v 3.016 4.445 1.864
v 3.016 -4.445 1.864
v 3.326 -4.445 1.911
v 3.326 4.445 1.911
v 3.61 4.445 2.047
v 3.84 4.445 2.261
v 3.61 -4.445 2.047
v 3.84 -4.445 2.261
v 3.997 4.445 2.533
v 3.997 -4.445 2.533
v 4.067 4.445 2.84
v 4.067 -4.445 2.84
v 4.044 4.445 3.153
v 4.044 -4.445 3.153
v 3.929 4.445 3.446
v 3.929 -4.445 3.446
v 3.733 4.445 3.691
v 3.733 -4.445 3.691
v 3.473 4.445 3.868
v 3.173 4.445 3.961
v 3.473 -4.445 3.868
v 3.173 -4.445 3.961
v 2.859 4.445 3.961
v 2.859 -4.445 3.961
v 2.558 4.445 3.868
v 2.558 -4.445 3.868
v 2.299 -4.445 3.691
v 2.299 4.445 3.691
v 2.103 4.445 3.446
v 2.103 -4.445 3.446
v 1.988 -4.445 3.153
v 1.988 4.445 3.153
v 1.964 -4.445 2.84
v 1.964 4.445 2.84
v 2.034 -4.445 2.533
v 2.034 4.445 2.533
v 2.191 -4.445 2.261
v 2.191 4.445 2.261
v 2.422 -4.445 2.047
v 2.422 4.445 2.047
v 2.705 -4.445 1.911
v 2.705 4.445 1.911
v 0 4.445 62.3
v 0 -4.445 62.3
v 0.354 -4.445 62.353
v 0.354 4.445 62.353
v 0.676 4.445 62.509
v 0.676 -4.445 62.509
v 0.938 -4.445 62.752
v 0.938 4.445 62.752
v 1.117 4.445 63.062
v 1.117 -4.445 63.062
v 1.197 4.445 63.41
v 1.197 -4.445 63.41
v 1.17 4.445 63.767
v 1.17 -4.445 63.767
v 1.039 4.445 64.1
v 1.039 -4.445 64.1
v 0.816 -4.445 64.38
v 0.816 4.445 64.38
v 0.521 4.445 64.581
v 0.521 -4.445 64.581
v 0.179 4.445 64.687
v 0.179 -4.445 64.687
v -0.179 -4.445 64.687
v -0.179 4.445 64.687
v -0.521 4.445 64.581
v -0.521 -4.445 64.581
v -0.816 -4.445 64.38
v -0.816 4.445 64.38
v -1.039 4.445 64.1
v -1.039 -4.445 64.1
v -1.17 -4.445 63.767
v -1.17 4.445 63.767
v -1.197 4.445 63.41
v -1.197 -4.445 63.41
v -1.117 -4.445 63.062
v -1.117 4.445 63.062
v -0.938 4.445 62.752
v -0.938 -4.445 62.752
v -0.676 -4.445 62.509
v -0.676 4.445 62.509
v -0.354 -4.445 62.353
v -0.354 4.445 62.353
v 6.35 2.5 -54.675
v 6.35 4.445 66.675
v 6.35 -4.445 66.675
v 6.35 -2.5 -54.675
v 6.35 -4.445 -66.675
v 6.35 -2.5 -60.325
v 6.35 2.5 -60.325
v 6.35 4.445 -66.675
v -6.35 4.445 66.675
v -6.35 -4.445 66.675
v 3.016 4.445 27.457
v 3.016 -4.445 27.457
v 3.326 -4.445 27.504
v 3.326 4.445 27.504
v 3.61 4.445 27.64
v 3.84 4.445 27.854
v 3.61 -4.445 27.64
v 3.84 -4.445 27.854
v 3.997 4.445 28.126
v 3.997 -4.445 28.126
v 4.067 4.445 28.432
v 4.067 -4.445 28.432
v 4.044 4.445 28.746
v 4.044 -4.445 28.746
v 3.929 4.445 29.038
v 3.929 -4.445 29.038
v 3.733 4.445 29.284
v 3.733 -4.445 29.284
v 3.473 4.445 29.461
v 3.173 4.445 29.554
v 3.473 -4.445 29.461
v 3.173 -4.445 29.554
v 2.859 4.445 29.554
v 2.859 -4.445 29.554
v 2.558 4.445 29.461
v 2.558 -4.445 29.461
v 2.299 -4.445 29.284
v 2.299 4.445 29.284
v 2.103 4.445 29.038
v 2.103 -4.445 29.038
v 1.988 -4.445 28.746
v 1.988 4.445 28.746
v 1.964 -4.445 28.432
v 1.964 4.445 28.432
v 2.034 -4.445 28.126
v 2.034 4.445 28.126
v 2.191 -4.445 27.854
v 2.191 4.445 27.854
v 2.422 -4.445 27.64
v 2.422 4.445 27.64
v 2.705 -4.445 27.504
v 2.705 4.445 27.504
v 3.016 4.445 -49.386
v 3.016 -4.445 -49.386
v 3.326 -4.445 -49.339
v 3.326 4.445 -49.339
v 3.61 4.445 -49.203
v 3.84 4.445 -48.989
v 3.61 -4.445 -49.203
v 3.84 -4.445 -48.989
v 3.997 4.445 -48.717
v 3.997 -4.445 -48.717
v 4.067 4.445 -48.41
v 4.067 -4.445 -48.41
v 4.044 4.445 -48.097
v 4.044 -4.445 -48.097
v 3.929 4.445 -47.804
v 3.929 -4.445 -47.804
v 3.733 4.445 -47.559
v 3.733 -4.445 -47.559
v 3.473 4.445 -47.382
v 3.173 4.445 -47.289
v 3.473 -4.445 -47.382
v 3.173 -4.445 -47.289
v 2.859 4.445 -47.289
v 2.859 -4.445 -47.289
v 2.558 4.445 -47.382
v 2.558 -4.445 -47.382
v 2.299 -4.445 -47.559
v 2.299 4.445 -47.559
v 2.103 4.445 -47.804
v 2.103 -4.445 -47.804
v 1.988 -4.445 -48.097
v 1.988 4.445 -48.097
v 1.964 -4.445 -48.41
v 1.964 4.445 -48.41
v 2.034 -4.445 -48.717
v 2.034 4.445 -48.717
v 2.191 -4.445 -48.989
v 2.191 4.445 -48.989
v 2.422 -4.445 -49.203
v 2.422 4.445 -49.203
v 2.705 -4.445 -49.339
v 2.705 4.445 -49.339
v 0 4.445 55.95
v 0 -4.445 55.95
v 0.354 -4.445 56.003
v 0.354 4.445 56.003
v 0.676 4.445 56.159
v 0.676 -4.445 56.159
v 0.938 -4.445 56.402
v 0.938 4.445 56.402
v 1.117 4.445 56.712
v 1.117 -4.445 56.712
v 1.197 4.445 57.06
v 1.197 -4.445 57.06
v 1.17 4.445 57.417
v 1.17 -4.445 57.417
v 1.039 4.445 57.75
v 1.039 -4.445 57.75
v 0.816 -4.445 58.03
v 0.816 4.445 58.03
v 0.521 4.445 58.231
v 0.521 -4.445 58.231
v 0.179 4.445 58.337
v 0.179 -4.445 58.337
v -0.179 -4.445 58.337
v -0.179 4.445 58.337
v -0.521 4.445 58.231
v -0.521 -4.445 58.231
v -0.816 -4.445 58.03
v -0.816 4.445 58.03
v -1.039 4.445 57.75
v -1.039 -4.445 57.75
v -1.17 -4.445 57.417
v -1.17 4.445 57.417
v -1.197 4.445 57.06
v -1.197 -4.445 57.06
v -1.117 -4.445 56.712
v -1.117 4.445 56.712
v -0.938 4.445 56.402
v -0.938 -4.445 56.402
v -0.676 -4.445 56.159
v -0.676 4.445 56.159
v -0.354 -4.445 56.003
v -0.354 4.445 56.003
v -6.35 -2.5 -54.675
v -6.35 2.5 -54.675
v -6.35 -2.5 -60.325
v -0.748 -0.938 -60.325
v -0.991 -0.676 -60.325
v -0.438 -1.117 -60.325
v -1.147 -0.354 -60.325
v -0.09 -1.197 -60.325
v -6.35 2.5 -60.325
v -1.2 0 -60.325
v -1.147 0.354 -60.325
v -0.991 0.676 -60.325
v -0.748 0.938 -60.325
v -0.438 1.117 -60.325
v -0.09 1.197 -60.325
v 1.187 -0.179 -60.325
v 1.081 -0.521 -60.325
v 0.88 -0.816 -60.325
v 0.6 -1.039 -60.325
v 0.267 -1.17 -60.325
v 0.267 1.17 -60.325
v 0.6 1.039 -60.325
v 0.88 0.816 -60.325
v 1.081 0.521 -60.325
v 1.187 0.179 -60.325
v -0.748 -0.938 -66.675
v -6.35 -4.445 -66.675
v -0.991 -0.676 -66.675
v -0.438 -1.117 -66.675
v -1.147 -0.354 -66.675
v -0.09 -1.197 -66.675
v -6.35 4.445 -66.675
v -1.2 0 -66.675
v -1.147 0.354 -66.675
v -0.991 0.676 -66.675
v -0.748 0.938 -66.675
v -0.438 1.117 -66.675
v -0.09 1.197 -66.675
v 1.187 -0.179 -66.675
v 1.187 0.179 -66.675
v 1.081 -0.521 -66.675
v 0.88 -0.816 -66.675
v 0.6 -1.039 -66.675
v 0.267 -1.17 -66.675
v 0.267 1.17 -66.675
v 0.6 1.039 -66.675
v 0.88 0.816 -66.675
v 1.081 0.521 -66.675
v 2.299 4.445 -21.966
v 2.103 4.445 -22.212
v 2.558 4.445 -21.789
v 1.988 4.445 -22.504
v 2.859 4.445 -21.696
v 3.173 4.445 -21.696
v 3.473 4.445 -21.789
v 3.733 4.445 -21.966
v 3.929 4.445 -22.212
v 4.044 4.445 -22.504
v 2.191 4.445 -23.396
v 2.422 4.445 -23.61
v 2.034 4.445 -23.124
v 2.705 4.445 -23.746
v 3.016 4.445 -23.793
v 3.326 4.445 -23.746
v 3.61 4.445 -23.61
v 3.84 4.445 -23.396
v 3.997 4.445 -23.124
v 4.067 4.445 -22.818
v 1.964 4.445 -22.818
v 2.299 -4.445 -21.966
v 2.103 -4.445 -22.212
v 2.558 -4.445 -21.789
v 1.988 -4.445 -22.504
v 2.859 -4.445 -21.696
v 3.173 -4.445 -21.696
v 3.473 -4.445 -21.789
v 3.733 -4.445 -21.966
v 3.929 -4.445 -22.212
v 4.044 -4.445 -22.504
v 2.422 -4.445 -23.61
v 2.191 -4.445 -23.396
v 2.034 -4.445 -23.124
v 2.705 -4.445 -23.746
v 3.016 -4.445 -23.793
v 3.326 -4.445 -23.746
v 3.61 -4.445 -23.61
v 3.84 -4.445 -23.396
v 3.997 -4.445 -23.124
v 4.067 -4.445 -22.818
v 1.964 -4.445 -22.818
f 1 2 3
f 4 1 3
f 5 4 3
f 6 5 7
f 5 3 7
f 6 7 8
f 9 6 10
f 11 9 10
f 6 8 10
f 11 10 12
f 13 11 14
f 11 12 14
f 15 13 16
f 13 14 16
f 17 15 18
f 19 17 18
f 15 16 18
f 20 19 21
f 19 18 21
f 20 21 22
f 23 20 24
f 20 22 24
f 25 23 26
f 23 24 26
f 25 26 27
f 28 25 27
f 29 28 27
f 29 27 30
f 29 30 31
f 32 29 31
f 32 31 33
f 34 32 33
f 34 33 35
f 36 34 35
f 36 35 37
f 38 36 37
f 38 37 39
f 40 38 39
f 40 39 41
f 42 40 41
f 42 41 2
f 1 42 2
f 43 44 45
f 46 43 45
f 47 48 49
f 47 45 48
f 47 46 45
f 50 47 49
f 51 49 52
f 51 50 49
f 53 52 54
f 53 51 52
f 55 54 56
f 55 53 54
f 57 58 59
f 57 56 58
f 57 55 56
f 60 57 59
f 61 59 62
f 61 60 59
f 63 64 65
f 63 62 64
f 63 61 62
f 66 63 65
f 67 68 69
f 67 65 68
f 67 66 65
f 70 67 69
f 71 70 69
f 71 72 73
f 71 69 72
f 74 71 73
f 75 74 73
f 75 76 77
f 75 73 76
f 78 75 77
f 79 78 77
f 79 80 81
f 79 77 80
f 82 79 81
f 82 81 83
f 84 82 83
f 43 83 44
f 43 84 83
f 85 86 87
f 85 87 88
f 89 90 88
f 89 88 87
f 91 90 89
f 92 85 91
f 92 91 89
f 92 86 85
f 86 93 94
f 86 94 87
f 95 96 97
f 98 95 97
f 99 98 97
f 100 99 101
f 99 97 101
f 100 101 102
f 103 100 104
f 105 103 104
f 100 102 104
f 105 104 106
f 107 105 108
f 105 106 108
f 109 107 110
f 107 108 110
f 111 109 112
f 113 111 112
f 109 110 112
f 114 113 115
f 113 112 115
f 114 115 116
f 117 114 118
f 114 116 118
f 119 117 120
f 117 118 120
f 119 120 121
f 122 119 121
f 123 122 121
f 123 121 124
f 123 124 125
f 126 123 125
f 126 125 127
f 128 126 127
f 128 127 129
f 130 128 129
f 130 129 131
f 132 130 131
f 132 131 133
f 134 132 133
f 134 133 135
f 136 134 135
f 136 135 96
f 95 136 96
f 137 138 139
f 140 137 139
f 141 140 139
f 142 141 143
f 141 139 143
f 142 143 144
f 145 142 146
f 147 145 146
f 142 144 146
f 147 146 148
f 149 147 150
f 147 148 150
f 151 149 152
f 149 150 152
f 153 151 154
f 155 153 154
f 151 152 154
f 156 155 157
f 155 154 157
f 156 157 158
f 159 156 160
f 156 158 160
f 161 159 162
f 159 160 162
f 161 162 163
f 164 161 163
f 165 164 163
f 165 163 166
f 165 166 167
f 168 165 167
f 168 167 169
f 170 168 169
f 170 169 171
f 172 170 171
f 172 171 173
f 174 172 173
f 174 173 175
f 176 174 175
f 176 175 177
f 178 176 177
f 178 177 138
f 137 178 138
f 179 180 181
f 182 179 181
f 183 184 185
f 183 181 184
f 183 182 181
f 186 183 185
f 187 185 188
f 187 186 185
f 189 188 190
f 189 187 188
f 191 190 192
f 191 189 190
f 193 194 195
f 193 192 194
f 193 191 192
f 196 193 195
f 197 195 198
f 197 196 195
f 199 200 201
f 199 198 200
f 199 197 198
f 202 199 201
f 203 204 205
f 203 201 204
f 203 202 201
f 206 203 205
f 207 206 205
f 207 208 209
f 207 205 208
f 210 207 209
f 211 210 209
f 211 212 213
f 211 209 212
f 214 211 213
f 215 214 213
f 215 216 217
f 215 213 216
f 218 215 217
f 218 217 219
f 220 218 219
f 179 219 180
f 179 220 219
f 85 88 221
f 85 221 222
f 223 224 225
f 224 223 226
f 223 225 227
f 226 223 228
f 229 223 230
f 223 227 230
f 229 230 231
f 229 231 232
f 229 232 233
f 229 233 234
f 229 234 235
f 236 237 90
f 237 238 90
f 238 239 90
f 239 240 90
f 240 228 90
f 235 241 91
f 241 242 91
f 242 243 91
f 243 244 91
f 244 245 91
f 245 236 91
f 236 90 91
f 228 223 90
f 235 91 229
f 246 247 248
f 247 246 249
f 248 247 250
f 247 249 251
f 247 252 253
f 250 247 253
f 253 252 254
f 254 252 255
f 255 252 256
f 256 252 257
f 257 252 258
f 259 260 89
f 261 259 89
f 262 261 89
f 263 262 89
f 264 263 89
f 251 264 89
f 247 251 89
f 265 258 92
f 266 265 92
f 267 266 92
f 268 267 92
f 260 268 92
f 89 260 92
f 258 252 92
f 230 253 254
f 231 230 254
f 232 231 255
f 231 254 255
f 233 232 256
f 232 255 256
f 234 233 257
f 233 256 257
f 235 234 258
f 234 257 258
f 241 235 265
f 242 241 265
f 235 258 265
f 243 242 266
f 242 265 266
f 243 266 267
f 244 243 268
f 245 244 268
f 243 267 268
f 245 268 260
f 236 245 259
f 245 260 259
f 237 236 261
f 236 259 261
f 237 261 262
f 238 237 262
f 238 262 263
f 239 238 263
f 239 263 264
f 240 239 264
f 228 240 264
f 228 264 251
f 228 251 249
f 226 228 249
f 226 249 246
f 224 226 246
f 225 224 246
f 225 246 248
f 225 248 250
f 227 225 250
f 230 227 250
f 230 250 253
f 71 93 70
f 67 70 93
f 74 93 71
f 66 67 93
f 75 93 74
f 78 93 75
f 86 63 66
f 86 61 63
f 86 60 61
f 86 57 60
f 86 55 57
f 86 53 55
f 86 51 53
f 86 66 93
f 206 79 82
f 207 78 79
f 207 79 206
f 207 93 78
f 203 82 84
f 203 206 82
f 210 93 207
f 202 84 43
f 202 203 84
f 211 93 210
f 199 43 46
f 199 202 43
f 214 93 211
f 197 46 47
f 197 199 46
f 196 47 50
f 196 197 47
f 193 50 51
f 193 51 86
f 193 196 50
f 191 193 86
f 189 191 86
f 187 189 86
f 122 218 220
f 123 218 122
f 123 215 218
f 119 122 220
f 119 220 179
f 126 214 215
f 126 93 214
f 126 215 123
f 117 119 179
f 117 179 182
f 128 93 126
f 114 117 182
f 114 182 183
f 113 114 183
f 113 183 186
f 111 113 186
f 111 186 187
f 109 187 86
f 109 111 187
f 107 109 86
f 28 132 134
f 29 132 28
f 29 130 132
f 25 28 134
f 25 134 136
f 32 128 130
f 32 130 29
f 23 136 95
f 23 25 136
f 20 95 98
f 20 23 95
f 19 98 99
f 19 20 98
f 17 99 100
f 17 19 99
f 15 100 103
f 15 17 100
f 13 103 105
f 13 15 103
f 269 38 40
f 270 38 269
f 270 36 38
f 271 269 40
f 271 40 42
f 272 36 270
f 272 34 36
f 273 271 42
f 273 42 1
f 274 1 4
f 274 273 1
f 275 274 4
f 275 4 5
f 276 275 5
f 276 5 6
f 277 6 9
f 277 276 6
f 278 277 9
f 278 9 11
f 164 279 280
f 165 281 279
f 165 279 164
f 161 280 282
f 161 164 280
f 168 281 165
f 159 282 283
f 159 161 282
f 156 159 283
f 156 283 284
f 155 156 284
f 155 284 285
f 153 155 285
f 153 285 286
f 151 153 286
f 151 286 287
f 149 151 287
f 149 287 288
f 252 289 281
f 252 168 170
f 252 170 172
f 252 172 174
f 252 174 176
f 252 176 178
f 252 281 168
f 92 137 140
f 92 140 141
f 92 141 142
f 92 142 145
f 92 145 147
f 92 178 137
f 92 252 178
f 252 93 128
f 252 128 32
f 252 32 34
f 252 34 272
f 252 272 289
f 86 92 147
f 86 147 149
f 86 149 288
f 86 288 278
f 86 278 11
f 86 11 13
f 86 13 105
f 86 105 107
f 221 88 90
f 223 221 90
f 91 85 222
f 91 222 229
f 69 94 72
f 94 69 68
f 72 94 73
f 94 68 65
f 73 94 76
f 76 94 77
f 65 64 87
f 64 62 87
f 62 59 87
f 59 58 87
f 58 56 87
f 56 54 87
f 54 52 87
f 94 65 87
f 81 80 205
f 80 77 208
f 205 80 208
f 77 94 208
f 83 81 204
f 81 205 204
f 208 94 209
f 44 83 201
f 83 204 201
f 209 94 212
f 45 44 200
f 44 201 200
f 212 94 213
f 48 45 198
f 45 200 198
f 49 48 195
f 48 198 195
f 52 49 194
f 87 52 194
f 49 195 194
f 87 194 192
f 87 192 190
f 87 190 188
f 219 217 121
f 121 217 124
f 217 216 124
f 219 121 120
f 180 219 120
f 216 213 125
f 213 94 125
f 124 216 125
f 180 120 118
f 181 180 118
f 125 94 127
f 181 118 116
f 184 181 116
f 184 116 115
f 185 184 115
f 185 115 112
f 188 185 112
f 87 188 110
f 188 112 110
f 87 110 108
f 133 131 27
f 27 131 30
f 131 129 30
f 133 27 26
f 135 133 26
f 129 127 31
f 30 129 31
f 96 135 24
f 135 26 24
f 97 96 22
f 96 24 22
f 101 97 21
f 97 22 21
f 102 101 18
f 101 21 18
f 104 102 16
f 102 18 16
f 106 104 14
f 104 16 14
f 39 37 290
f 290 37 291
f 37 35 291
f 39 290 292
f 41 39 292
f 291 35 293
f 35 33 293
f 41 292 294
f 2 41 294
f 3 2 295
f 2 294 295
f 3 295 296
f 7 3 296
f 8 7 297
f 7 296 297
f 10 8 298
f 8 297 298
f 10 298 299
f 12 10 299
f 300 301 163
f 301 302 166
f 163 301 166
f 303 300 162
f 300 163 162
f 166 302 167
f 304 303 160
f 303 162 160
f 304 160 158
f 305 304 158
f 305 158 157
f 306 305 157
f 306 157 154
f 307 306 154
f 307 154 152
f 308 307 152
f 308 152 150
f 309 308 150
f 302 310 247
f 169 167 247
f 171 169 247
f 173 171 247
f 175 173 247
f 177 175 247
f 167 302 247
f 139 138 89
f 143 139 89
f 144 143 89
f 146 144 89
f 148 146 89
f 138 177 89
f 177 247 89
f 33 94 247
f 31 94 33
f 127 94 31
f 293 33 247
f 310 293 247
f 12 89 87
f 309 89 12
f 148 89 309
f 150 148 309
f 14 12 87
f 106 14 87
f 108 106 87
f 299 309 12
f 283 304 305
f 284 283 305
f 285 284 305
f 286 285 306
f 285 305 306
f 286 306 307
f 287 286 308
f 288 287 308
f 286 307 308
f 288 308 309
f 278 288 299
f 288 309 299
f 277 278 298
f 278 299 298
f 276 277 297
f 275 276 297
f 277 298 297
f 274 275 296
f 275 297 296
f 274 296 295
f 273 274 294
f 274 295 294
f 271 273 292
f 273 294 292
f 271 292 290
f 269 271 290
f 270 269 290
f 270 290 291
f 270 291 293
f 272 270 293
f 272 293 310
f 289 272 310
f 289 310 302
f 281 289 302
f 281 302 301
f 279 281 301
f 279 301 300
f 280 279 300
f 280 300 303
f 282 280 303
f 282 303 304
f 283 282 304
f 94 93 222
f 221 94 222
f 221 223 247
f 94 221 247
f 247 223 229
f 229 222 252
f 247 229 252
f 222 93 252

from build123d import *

# Parameters (mm, degrees)
SKETCH1_W               = 12.7
SKETCH1_H               = 133.35
BOSS_EXTRUDE1_DEPTH     = 4.445
CUT_EXTRUDE1_DEPTH      = 68.564119361
CUT_EXTRUDE1_DEPTH_BACK = 68.564119361
SKETCH2_R               = 1.2
SKETCH3_R               = 1.2
CUT_EXTRUDE2_DEPTH      = 12
SKETCH4_W               = 5.65
SKETCH4_H               = 5
CUT_EXTRUDE3_DEPTH      = 69.019141791
SKETCH5_R               = 1.054294776
CUT_EXTRUDE4_DEPTH      = 68.564119361


with BuildPart() as part:
    # Sketch1 → Boss-Extrude1 (new, symmetric)
    with BuildSketch(Plane(origin=(0, 0, 0), x_dir=(1, 0, 0), z_dir=(0, 1, 0))):
        Rectangle(SKETCH1_W, SKETCH1_H)
    extrude(amount=BOSS_EXTRUDE1_DEPTH, both=True)

    # Sketch2 → Cut-Extrude1 (cut, two sides: drawn at the far end of the back side and taken through both)
    with BuildSketch(Plane.XZ.offset(4.445).offset(-CUT_EXTRUDE1_DEPTH_BACK)):
        with Locations(Location((0, 57.15, 0), (0, 0, 270))):
            Circle(SKETCH2_R)
        with Locations(Location((0, 63.5, 0), (0, 0, 270))):
            Circle(SKETCH2_R)
    extrude(amount=CUT_EXTRUDE1_DEPTH + CUT_EXTRUDE1_DEPTH_BACK, mode=Mode.SUBTRACT)

    # Sketch3 → Cut-Extrude2 (cut)
    with BuildSketch(Plane(origin=(0, 0, -66.675), x_dir=(-1, 0, 0), z_dir=(0, 0, -1))):
        Circle(SKETCH3_R)
    extrude(amount=-CUT_EXTRUDE2_DEPTH, mode=Mode.SUBTRACT)

    # Sketch4 → Cut-Extrude3 (cut, through all)
    with BuildSketch(Plane(origin=(6.35, 0, 0), x_dir=(0, 0, -1), z_dir=(1, 0, 0))):
        with Locations((57.5, 0)):
            Rectangle(SKETCH4_W, SKETCH4_H)
    extrude(amount=-CUT_EXTRUDE3_DEPTH, mode=Mode.SUBTRACT)

    # Sketch5 → Cut-Extrude4 (cut, through all)
    with BuildSketch(Plane.XZ.offset(4.445)):
        with Locations(Location((3.015690418, -48.331496192, 0), (0, 0, 270))):
            Circle(SKETCH5_R)
        with Locations(Location((3.015690418, -22.739006486, 0), (0, 0, 270))):
            Circle(SKETCH5_R)
        with Locations(Location((3.015690418, 2.918503808, 0), (0, 0, 270))):
            Circle(SKETCH5_R)
        with Locations(Location((3.015690418, 28.510993514, 0), (0, 0, 270))):
            Circle(SKETCH5_R)
    extrude(amount=-CUT_EXTRUDE4_DEPTH, mode=Mode.SUBTRACT)


solid = part.part
